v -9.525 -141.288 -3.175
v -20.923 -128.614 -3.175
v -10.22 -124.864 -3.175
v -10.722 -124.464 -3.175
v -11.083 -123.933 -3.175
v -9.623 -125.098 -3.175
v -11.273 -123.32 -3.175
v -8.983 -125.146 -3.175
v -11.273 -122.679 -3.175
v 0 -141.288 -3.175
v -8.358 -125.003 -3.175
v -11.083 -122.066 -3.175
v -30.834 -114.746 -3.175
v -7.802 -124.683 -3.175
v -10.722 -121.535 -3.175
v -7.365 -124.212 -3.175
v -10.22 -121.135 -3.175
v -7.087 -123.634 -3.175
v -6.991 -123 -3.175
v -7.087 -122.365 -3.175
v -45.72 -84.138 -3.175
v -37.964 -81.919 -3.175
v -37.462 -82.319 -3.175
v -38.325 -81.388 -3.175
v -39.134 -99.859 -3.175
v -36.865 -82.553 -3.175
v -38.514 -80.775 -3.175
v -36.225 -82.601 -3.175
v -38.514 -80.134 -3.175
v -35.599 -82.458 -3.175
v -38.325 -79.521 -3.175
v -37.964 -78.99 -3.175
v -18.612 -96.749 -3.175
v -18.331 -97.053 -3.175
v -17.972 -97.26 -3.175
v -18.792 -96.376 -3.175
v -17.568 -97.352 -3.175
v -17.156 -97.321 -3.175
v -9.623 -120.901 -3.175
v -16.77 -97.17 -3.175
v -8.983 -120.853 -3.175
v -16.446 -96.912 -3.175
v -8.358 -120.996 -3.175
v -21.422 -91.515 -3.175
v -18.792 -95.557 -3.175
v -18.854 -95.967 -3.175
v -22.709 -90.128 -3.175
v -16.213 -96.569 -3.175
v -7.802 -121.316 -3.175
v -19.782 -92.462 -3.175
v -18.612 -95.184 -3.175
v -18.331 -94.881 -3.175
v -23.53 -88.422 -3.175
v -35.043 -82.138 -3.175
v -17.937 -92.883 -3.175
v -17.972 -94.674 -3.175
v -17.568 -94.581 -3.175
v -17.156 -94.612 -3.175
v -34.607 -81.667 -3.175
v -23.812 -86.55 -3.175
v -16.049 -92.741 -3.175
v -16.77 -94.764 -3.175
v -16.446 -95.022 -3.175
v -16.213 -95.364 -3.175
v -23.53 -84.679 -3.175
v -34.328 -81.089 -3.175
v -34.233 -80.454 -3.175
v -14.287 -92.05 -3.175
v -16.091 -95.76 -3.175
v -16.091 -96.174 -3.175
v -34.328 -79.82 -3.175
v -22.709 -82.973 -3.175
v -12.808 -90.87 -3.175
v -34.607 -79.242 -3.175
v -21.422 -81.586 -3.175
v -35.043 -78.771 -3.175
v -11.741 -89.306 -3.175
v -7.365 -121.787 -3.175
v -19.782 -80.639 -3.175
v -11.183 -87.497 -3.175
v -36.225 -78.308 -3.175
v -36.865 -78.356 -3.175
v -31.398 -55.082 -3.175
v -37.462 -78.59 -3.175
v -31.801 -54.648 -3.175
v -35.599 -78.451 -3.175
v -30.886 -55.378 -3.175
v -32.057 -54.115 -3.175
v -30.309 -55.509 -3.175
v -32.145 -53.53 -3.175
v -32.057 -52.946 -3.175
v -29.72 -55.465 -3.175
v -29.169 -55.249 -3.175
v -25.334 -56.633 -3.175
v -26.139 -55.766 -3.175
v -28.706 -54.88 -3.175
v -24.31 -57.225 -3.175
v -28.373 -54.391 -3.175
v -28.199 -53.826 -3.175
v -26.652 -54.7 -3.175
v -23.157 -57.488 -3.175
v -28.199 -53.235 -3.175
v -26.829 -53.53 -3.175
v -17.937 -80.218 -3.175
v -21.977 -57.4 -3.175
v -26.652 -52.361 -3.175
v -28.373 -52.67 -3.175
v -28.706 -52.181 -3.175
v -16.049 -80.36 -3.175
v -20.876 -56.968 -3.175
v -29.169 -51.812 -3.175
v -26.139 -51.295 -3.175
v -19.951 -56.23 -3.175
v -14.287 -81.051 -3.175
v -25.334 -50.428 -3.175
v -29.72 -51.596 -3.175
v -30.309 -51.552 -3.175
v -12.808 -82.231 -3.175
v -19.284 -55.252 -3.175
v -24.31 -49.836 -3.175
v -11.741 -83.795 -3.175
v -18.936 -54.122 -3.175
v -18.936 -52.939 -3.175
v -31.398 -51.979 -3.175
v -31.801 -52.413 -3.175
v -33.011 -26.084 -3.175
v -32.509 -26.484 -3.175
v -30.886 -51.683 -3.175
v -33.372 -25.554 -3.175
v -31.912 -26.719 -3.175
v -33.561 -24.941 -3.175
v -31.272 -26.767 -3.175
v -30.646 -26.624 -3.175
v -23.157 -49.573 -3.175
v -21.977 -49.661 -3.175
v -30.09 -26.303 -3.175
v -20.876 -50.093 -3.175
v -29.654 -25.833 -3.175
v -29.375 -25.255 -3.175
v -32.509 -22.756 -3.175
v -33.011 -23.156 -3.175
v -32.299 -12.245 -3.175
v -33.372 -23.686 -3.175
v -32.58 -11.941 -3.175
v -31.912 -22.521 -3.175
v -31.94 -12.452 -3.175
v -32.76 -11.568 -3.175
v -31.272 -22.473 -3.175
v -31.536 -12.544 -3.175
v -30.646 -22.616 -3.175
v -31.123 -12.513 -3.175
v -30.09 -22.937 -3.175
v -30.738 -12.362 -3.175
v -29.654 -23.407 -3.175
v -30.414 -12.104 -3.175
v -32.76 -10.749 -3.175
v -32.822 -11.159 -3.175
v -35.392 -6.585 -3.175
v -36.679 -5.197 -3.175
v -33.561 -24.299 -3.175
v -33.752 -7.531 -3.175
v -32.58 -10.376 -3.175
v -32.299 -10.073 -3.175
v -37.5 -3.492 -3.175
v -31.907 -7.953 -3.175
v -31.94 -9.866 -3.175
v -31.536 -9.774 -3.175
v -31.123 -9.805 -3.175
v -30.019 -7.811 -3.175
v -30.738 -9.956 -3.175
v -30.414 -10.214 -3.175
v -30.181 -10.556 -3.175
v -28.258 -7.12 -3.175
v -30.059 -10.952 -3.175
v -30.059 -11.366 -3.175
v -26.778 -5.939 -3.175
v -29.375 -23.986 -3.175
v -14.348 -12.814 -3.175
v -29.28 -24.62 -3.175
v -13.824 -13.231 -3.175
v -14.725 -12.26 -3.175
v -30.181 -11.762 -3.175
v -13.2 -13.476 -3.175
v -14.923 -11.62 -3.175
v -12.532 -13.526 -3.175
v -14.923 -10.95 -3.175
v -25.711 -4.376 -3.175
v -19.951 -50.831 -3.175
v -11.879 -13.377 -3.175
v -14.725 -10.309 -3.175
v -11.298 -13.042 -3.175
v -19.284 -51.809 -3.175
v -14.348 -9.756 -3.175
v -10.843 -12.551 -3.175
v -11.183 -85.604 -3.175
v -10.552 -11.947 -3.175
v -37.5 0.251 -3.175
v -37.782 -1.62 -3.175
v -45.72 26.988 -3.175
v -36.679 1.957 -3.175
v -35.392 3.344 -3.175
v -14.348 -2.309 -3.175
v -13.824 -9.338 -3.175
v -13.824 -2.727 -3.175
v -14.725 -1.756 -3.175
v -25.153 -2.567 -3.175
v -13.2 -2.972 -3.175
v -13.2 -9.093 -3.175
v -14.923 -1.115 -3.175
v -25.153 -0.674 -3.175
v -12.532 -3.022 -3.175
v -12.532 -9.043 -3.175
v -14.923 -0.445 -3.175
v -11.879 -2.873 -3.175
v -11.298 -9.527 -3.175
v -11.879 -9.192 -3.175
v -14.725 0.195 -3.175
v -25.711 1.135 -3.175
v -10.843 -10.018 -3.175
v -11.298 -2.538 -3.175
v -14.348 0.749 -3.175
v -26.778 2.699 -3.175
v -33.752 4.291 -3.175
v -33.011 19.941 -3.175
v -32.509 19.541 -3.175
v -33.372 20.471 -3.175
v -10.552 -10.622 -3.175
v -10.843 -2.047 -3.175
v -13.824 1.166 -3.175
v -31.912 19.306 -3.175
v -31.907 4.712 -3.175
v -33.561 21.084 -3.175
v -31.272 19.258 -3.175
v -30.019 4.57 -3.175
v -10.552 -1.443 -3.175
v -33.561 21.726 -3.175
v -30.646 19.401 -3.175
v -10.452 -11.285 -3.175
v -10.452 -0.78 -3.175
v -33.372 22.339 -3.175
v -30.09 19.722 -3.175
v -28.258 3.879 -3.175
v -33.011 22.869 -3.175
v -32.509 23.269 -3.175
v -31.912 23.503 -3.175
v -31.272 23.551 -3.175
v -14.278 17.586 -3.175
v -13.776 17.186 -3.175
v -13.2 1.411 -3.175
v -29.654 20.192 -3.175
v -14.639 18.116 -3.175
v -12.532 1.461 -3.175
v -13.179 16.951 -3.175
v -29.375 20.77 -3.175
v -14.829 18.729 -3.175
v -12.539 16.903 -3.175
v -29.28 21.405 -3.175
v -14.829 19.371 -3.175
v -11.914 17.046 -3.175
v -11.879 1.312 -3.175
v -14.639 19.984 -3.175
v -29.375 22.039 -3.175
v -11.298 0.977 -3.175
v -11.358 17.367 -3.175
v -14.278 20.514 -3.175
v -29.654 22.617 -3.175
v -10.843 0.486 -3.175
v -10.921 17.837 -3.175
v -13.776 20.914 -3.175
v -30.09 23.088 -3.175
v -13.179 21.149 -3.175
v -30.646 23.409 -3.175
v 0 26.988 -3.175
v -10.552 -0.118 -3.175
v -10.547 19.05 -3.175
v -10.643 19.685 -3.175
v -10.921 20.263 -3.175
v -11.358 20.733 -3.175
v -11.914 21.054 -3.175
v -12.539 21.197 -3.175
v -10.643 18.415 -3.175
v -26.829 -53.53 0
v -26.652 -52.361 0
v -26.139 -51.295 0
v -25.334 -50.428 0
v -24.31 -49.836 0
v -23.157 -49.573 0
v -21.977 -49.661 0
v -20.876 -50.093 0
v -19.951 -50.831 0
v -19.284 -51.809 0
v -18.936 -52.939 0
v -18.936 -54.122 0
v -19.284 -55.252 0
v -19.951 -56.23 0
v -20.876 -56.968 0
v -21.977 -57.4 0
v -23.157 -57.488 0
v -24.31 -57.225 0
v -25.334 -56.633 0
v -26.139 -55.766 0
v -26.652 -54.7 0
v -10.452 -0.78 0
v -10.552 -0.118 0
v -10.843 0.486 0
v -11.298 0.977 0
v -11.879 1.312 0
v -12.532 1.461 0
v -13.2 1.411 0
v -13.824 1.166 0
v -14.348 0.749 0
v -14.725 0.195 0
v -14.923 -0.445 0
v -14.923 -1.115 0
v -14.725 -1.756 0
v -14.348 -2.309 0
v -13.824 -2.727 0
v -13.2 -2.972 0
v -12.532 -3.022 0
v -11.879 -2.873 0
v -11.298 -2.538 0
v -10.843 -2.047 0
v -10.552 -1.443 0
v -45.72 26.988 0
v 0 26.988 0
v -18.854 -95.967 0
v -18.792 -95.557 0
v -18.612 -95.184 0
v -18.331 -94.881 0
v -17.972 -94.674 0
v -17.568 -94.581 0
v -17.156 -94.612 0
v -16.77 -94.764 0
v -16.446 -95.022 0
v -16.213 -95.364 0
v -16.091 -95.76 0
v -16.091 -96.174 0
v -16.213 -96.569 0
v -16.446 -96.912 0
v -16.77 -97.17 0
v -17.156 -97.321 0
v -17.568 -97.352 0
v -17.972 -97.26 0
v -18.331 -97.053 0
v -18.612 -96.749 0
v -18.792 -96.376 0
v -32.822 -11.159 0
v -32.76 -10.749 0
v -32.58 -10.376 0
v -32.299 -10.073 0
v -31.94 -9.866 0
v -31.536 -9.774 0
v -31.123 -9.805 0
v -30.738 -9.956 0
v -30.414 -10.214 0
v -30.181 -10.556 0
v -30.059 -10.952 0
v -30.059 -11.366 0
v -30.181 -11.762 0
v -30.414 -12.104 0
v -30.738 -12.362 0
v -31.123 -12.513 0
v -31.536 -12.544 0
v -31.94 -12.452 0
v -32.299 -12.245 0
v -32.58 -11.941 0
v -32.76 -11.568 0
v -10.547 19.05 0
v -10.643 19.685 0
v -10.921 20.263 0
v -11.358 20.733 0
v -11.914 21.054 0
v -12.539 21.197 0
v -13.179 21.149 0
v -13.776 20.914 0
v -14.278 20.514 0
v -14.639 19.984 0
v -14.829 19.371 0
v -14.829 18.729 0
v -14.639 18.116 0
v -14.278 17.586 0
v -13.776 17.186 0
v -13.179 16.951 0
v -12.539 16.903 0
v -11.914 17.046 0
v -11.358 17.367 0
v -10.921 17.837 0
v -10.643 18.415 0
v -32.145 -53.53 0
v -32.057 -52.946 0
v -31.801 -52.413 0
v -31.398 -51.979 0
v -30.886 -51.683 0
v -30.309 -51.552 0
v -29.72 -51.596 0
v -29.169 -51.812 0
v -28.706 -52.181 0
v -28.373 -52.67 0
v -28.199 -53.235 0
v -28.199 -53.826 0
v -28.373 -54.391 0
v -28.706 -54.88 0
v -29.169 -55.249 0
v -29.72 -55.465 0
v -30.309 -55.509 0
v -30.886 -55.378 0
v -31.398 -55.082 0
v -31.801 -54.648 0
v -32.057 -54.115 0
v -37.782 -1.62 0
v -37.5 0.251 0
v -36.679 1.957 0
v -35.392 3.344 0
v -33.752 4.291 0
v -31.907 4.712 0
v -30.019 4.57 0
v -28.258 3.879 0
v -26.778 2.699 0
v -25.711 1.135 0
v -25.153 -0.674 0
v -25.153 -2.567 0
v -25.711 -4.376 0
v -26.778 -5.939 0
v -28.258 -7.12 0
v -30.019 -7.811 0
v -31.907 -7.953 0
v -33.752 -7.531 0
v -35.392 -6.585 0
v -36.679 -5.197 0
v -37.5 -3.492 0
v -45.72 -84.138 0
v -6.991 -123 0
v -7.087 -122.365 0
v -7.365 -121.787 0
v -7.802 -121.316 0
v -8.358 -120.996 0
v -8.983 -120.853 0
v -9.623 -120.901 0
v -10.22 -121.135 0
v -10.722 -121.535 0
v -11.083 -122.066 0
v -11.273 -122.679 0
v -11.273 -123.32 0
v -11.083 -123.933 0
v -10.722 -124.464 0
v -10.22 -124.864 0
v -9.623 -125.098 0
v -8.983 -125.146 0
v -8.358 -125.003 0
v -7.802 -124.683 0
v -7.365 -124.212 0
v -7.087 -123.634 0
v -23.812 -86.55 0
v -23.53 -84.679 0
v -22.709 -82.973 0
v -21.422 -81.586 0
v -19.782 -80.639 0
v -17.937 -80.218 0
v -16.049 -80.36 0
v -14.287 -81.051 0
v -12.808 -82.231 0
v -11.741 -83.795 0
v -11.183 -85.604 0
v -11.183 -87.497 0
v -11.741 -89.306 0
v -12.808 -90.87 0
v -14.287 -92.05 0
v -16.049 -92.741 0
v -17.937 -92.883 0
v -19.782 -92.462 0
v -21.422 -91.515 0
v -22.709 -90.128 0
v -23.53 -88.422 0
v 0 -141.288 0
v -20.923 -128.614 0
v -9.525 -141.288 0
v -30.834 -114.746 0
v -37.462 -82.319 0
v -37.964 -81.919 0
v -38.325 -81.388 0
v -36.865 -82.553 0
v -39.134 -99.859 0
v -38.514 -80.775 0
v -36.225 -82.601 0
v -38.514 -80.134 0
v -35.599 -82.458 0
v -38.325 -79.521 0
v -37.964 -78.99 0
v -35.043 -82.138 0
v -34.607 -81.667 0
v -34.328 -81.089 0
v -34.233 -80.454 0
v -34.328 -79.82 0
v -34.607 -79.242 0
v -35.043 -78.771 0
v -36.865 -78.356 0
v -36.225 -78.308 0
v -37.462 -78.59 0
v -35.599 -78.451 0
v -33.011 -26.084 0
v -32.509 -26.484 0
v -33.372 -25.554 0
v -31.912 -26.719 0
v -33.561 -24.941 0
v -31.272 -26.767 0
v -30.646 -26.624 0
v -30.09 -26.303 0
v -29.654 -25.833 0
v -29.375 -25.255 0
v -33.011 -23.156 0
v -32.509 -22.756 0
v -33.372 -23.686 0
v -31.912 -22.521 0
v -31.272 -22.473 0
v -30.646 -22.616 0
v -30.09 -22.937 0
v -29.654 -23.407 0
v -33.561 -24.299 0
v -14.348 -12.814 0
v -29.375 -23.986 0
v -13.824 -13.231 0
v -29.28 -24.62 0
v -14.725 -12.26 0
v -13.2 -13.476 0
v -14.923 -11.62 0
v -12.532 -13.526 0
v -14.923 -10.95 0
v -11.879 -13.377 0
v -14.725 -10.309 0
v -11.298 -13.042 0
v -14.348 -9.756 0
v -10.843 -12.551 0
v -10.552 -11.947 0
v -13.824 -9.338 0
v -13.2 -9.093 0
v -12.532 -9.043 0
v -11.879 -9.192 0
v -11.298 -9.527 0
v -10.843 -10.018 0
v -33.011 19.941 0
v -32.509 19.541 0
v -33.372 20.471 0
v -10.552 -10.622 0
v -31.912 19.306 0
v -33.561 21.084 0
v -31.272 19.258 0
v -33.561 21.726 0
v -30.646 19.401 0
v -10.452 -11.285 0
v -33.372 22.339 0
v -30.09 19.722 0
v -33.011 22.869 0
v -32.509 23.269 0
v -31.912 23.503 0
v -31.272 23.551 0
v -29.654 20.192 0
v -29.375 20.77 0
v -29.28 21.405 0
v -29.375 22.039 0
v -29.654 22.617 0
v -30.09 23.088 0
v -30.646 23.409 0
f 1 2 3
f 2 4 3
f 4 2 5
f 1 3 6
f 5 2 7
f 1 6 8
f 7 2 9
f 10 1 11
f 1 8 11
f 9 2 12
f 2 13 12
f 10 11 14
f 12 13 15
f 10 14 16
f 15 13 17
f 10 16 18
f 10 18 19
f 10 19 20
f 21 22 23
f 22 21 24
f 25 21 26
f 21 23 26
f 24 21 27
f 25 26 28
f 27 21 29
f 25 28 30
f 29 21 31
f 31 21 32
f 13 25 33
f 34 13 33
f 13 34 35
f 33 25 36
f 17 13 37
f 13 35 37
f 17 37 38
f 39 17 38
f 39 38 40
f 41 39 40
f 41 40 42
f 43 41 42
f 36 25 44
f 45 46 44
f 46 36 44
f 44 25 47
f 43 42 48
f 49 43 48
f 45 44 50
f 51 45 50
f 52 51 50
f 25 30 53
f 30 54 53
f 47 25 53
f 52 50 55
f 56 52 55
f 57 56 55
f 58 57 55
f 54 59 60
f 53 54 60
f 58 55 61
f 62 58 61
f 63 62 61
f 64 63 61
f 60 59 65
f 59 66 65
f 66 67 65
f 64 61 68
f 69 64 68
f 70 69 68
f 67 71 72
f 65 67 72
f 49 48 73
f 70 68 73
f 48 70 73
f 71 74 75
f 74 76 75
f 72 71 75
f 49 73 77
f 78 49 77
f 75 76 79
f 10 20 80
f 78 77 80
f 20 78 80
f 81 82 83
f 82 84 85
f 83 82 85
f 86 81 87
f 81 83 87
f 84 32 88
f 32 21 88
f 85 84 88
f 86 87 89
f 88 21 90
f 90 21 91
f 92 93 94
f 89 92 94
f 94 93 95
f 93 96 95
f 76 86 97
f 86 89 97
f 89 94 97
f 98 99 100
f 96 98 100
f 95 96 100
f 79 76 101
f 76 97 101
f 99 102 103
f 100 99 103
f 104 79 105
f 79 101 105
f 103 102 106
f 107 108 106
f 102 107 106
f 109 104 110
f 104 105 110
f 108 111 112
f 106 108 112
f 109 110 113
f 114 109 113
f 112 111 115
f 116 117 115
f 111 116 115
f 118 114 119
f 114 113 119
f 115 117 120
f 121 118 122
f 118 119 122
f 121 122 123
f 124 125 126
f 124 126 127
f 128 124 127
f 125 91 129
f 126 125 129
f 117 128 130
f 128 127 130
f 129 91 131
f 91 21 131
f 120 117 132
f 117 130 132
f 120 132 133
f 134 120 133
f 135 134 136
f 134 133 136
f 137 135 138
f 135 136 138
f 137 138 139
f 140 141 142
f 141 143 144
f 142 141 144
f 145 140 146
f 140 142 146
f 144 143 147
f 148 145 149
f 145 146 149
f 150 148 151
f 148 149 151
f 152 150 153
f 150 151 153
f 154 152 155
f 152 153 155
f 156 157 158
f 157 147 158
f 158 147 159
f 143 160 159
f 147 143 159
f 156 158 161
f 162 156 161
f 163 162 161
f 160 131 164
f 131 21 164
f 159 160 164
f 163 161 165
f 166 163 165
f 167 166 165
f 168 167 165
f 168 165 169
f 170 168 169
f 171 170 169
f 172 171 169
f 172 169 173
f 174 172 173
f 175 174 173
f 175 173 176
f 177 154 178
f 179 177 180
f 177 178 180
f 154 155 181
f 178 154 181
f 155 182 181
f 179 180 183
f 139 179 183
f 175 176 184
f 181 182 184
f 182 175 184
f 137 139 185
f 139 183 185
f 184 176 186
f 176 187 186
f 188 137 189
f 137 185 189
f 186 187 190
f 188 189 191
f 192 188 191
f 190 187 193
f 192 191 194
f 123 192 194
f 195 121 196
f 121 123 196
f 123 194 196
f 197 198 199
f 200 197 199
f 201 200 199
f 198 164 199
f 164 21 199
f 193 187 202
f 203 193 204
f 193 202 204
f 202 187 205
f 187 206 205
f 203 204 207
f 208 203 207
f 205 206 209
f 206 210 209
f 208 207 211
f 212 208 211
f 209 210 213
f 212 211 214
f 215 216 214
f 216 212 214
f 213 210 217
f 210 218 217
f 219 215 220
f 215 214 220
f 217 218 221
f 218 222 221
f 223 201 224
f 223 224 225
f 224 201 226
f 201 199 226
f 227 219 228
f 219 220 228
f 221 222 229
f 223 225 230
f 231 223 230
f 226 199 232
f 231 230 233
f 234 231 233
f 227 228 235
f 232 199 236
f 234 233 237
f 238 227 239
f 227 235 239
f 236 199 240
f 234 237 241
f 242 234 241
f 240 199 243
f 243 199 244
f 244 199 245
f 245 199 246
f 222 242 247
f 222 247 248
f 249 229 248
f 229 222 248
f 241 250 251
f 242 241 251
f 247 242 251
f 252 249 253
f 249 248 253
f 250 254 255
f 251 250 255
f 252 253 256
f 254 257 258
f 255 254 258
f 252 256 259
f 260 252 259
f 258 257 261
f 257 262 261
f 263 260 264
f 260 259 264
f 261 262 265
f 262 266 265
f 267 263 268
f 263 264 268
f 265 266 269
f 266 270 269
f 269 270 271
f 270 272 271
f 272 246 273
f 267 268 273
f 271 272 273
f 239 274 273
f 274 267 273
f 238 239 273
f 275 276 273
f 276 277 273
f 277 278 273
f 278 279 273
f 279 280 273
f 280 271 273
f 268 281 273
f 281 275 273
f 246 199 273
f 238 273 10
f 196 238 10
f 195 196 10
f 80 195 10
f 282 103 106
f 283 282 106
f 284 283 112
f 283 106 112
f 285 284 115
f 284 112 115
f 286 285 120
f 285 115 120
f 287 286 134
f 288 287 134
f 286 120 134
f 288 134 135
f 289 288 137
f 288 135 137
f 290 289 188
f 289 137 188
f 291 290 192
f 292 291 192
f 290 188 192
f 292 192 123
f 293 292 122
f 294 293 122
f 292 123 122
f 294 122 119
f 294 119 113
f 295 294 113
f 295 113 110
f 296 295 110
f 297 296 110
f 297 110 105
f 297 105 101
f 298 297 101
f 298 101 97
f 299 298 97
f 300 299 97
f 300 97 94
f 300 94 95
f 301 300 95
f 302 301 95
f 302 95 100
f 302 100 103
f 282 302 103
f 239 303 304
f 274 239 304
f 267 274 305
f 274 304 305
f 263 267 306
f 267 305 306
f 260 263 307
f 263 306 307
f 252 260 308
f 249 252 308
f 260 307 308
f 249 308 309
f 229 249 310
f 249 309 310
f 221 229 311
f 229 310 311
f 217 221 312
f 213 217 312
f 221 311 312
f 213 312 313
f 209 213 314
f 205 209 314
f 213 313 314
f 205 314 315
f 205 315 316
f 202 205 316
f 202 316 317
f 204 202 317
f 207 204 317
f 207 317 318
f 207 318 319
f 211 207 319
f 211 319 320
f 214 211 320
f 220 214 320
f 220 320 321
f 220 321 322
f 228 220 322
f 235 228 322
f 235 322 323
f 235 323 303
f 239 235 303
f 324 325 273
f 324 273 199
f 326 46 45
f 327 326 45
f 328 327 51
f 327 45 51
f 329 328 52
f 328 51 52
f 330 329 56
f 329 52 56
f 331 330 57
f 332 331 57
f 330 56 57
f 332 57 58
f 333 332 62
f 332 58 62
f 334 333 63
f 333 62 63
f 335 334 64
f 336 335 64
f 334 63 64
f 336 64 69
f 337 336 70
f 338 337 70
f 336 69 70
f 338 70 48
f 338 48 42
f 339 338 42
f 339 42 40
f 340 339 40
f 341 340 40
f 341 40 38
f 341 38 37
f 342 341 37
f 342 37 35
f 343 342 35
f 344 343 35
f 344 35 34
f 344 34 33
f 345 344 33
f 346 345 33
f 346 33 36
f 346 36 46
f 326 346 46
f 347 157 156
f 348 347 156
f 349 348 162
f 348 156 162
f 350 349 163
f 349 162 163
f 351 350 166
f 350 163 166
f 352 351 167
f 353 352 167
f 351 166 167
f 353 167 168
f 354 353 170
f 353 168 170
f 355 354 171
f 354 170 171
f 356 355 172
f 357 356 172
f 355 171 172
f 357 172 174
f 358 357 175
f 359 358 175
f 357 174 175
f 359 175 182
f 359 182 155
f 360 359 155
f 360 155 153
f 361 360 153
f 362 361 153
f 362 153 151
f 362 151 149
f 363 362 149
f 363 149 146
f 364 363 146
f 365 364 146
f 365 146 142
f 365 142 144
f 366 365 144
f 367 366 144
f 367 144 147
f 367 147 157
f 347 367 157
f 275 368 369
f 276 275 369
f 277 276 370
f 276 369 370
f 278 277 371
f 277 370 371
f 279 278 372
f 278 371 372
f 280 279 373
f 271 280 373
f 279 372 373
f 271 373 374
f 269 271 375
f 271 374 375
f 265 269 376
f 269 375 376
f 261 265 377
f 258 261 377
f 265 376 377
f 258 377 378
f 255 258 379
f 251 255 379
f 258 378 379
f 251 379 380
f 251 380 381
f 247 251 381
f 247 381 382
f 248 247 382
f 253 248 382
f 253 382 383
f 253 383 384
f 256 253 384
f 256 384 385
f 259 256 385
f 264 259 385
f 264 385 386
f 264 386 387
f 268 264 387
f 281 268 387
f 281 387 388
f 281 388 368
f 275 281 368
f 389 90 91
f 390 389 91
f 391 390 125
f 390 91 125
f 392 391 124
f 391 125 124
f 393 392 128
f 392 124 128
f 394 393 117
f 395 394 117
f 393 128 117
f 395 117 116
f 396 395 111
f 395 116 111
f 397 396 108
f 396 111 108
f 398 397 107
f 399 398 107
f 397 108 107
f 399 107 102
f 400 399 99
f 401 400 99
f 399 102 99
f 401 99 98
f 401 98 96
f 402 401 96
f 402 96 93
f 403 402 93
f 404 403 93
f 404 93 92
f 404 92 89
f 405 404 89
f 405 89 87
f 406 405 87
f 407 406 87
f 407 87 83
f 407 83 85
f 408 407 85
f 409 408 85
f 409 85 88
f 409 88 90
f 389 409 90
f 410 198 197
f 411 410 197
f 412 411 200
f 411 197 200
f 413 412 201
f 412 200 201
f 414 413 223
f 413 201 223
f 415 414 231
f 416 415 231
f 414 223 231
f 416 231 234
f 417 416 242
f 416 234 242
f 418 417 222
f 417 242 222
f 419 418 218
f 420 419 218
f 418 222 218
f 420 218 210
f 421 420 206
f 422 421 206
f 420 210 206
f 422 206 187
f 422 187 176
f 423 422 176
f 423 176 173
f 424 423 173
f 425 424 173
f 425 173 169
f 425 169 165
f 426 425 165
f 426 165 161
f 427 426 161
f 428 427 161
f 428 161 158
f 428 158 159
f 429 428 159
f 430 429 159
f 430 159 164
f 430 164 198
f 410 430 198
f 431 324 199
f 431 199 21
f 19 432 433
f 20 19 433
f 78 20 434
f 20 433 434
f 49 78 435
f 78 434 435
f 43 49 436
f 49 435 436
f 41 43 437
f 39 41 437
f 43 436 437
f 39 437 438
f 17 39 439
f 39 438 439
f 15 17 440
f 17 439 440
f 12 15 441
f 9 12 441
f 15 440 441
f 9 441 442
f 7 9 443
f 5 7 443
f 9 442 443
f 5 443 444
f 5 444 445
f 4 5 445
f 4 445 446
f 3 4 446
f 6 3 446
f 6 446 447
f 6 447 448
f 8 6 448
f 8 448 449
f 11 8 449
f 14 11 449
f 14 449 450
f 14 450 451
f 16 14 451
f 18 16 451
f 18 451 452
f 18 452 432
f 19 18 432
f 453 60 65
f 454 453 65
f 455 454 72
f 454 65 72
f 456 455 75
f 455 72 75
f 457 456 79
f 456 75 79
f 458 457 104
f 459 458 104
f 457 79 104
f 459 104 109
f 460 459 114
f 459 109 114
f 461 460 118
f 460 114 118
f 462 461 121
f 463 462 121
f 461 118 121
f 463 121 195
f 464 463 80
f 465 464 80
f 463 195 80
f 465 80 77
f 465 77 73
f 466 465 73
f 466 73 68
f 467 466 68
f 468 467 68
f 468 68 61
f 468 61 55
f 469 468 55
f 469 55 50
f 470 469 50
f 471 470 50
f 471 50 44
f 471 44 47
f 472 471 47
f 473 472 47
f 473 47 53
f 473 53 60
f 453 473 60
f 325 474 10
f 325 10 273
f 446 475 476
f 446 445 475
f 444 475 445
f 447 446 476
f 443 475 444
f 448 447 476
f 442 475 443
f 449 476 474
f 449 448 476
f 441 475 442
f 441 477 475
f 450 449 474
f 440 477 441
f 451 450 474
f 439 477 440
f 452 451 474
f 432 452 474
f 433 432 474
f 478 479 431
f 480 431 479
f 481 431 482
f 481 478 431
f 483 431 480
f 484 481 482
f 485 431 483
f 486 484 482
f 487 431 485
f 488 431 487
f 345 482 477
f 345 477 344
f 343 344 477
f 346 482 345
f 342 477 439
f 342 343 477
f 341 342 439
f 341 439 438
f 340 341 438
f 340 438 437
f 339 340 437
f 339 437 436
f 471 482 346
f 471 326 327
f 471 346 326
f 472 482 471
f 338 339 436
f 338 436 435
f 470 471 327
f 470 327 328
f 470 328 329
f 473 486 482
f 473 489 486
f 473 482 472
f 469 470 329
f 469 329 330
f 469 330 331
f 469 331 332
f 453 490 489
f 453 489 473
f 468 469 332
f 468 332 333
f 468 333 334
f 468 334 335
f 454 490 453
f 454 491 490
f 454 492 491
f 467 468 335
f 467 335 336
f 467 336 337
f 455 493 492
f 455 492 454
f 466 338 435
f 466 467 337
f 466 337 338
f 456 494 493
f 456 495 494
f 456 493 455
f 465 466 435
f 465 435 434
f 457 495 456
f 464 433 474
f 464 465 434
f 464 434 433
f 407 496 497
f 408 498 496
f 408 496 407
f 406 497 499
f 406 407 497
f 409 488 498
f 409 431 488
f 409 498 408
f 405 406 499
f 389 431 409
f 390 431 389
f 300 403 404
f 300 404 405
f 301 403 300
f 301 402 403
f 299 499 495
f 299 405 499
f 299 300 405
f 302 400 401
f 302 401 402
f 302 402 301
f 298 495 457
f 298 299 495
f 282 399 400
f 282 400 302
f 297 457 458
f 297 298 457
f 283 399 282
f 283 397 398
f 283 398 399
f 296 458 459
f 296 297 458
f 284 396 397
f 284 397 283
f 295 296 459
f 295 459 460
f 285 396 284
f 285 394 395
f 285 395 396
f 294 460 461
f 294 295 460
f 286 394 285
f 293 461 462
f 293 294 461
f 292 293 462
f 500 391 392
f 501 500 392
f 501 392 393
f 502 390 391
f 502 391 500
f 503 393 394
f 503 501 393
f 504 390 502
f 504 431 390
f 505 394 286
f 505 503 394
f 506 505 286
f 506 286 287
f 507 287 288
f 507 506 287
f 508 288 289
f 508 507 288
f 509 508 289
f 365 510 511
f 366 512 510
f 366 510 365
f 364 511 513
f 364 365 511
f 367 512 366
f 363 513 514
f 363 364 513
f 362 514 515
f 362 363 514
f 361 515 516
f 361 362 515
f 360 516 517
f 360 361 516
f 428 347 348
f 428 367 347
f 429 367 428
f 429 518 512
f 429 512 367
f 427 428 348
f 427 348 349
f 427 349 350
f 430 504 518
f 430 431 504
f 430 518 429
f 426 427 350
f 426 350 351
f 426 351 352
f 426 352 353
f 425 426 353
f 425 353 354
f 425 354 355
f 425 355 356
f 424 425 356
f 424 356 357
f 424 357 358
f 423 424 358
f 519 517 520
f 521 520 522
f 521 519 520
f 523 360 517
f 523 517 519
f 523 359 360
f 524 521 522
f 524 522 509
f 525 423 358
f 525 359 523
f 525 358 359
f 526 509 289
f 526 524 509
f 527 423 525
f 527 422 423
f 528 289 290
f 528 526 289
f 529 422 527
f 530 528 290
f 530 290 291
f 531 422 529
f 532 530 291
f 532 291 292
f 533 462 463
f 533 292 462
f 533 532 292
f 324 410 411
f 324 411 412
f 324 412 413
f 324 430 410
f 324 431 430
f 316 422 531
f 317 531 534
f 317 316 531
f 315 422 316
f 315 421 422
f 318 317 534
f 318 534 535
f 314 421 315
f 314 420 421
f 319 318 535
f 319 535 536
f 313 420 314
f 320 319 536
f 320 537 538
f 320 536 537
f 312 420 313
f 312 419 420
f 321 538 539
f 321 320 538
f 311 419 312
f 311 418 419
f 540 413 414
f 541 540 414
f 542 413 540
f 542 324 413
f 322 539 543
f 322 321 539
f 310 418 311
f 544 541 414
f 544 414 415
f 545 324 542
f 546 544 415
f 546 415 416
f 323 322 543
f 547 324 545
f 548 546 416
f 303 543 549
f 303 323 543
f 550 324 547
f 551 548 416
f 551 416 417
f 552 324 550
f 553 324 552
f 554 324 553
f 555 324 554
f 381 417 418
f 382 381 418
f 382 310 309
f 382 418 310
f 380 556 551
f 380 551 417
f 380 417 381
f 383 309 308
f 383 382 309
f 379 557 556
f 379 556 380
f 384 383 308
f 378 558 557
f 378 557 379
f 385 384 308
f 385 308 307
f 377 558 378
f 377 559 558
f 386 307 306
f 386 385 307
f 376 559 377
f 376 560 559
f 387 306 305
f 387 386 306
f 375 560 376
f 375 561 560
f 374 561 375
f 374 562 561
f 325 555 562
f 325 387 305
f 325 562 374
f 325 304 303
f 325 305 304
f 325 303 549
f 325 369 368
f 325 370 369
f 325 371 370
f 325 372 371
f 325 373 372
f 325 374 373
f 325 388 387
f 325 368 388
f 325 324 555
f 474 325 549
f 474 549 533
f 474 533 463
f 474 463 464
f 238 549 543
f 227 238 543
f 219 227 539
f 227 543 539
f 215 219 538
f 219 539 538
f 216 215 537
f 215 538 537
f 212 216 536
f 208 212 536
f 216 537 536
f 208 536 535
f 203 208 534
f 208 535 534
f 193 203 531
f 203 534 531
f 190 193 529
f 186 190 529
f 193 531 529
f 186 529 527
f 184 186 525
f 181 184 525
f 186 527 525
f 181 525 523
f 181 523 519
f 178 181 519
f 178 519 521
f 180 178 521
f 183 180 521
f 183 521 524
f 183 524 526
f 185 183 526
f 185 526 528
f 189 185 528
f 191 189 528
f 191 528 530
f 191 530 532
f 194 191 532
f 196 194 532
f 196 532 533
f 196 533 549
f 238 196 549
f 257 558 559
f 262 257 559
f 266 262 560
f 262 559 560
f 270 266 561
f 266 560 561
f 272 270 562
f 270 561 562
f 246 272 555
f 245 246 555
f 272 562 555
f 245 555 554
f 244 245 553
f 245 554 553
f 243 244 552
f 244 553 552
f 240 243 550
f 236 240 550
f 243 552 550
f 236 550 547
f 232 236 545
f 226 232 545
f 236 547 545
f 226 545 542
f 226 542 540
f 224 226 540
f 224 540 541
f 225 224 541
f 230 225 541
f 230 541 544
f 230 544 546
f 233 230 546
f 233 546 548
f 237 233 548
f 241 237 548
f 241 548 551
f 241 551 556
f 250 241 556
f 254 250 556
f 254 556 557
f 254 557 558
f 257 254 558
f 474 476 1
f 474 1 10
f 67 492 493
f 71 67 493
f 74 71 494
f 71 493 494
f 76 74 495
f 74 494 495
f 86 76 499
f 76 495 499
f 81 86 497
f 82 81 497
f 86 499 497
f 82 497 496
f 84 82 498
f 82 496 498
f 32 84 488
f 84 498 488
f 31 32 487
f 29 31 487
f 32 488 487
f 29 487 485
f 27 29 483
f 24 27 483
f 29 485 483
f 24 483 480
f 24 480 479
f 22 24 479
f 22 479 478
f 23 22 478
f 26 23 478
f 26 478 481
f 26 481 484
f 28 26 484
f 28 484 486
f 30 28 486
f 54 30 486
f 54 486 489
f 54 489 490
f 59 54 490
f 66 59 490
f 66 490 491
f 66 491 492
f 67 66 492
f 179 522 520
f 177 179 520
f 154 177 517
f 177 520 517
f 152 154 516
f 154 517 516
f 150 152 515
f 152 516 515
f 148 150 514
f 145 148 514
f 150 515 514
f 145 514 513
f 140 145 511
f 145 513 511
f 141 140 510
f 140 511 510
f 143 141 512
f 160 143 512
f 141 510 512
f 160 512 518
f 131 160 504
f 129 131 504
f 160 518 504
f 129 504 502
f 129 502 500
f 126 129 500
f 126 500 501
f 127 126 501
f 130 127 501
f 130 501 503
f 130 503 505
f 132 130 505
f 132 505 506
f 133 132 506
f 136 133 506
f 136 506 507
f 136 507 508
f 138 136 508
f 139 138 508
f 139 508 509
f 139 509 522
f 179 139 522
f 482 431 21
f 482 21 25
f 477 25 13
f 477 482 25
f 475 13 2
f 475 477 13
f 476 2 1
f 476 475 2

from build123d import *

# Parameters (mm, degrees)
BOSS_EXTRUDE1_DEPTH             = 3.175
F_1_2_0_5_DIAMETER_HOLE1_D      = 12.7
F_5_16_0_3125_DIAMETER_HOLE1_D  = 7.9375
F_5_32_0_15625_DIAMETER_HOLE1_D = 3.96875
F_7_64_0_10938_DIAMETER_HOLE1_D = 2.778252
F_6_CLEARANCE_HOLE1_D           = 4.3053
F_16_0_177_DIAMETER_HOLE1_D     = 4.4958


with BuildPart() as part:
    # Sketch1 → Boss-Extrude1 (new body)
    with BuildSketch(Plane.XY):
        with BuildLine():
            Line((-45.72, 26.9875), (-45.72, -84.1375))
            ThreePointArc((-45.72, -84.1375), (-30.833523511, -114.746148224), (-9.525, -141.2875))
            Line((-9.525, -141.2875), (0, -141.2875))
            Line((0, -141.2875), (0, 26.9875))
            Line((0, 26.9875), (-45.72, 26.9875))
        make_face()
    extrude(amount=-BOSS_EXTRUDE1_DEPTH)

    # 1/2 (0.5) Diameter Hole1 (through all)
    with Locations(Plane.XY):
        with Locations((-17.4625, -86.5505), (-31.4325, -1.620345612)):
            Hole(F_1_2_0_5_DIAMETER_HOLE1_D / 2)

    # 5/16 (0.3125) Diameter Hole1 (through all)
    with Locations(Plane.XY):
        with Locations((-22.86, -53.5305)):
            Hole(F_5_16_0_3125_DIAMETER_HOLE1_D / 2)

    # 5/32 (0.15625) Diameter Hole1 (through all)
    with Locations(Plane.XY):
        with Locations((-30.161117219, -53.5305)):
            Hole(F_5_32_0_15625_DIAMETER_HOLE1_D / 2)

    # 7/64 (0.10938) Diameter Hole1 (through all)
    with Locations(Plane.XY):
        with Locations((-17.464635625, -95.966719242), (-31.4325, -11.158858051)):
            Hole(F_7_64_0_10938_DIAMETER_HOLE1_D / 2)

    # #6 Clearance Hole1 (through all)
    with Locations(Plane(origin=(0, 0, -3.175), x_dir=(-1, 0, 0), z_dir=(0, 0, -1))):
        with Locations((12.7, 19.05), (36.3855, -80.4545), (9.144, -122.9995), (31.4325, -24.620045612), (31.4325, 21.404754388)):
            Hole(F_6_CLEARANCE_HOLE1_D / 2)

    # #16 (0.177) Diameter Hole1 (through all)
    with Locations(Plane(origin=(0, 0, -3.175), x_dir=(-1, 0, 0), z_dir=(0, 0, -1))):
        with Locations((12.7, -0.780389216), (12.7, -11.284610784)):
            Hole(F_16_0_177_DIAMETER_HOLE1_D / 2)


solid = part.part
